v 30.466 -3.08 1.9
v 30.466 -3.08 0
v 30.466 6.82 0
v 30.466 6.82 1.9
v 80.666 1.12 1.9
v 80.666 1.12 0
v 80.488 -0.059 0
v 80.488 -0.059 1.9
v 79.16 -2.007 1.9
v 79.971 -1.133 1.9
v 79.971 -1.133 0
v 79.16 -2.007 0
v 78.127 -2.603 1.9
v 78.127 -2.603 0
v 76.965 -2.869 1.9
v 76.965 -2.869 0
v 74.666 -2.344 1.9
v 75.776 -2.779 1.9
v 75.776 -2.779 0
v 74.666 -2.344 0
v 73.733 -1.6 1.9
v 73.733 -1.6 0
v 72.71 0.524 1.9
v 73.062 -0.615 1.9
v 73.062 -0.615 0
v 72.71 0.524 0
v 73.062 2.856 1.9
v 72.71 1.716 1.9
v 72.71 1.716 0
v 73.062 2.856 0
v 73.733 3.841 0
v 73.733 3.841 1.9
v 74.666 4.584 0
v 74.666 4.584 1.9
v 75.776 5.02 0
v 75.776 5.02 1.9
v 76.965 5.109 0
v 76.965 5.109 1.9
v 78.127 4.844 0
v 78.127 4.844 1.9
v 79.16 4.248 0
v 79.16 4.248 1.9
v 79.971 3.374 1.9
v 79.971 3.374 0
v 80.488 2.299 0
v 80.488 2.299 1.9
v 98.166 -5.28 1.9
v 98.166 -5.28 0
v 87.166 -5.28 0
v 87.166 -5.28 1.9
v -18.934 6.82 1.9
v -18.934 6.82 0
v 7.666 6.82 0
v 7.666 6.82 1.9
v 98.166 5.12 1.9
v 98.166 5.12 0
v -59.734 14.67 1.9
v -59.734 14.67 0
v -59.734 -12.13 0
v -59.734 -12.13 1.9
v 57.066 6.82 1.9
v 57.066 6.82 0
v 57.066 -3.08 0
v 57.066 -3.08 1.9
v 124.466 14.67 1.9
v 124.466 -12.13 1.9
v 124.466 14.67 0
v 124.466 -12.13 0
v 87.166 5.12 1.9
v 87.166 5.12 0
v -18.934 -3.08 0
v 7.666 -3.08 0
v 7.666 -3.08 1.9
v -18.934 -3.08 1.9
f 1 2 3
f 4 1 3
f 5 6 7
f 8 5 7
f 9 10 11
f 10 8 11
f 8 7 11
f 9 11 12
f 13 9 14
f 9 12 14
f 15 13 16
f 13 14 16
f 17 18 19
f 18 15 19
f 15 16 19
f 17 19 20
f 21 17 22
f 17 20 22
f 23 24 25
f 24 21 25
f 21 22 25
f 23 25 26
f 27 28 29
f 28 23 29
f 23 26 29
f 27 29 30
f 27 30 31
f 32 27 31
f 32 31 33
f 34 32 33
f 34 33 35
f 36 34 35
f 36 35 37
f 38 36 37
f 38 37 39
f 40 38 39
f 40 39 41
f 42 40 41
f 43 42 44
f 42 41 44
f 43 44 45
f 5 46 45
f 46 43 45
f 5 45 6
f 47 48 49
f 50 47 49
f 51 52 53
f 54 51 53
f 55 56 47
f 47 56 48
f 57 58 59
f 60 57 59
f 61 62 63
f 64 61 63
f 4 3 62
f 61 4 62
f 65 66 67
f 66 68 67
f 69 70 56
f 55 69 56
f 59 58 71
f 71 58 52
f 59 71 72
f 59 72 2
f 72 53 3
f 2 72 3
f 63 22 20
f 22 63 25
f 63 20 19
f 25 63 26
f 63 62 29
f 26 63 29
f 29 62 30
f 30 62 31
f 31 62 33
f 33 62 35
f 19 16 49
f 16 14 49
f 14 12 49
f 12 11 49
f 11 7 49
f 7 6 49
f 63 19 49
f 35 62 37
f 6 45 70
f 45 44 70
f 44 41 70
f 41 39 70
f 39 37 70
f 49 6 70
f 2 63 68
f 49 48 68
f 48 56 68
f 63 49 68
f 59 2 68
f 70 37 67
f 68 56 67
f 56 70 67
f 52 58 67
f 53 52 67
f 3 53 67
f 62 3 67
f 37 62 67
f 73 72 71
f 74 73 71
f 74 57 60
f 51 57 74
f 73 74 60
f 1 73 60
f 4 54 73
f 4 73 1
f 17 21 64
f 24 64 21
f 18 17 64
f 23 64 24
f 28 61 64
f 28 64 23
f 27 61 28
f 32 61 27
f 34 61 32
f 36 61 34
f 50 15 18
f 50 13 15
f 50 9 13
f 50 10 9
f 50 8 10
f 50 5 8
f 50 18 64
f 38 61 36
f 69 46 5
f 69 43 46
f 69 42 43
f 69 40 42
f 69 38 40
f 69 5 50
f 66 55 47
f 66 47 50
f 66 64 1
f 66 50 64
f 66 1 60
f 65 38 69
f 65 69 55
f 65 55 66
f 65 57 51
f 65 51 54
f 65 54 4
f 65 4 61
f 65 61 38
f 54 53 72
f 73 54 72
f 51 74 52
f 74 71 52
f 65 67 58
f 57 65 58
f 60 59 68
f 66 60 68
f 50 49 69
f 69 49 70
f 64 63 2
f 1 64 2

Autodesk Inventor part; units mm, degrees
ref_plane "YZ Plane" through (0, 0, 0) normal (1, 0, 0) x (0, 1, 0)
ref_plane "XZ Plane" through (0, 0, 0) normal (0, 1, 0) x (-1, 0, 0)
ref_plane "XY Plane" through (0, 0, 0) normal (0, 0, 1) x (1, 0, 0)
sketch "Sketch1" plane through (0, 0, 0) normal (0, 0, 1) x (1, 0, 0)
  circle A0 centre (76.6657, 1.1203) radius 3
  line L0 (88.1657, -4.2797) -> (97.1657, -4.2797)
  line L1 (97.1657, -4.2797) -> (97.1657, 4.1203)
  line L2 (97.1657, 4.1203) -> (88.1657, 4.1203)
  line L3 (124.4657, -12.1297) -> (124.4657, 14.6703)
  line L4 (88.1657, 4.1203) -> (88.1657, -4.2797)
  line L5 (56.0657, -2.0797) -> (56.0657, 5.8203)
  line L6 (33.6679, 7.1494) -> (33.6679, -2.7506)
  line L7 (32.8657, 14.6703) -> (32.8657, -12.1297)
  line L8 (31.4657, -2.0797) -> (56.0657, -2.0797)
  line L9 (56.0657, 5.8203) -> (31.4657, 5.8203)
  line L10 (124.4657, 14.6703) -> (-59.7343, 14.6703)
  line L11 (-59.7343, -5.3797) -> (124.4657, -5.3797)
  line L12 (-59.7343, -12.1297) -> (124.4657, -12.1297)
  line L13 (31.4657, 5.8203) -> (31.4657, -2.0797)
  line L14 (-59.7343, 14.6703) -> (-59.7343, -12.1297)
  line L15 (6.6657, -2.0797) -> (6.6657, 5.8203)
  line L16 (-17.9343, -2.0797) -> (6.6657, -2.0797)
  line L17 (-17.9343, 5.8203) -> (-17.9343, -2.0797)
  line L18 (6.6657, 5.8203) -> (-17.9343, 5.8203)
  line L19 (7.6657, 6.8203) -> (7.6657, -3.0797)
  line L20 (7.6657, -3.0797) -> (-18.9343, -3.0797)
  line L21 (-18.9343, -3.0797) -> (-18.9343, 6.8203)
  line L22 (-18.9343, 6.8203) -> (7.6657, 6.8203)
  line L23 (57.0657, 6.8203) -> (57.0657, -3.0797)
  line L24 (57.0657, -3.0797) -> (30.4657, -3.0797)
  line L25 (30.4657, -3.0797) -> (30.4657, 6.8203)
  line L26 (30.4657, 6.8203) -> (57.0657, 6.8203)
  circle A1 centre (76.6657, 1.1203) radius 4
  line L27 (98.1657, 5.1203) -> (98.1657, -5.2797)
  line L28 (98.1657, -5.2797) -> (87.1657, -5.2797)
  line L29 (87.1657, -5.2797) -> (87.1657, 5.1203)
  line L30 (87.1657, 5.1203) -> (98.1657, 5.1203)
  point P0 (0, 0)
  point P1 (0, 0)
  dimension "d1" = 6.75
  dimension "d2" = 7.9
  dimension "d3" = 24.6
  dimension "d4" = 3.3
  dimension "d5" = 3.3
  dimension "d6" = 24.6
  dimension "d7" = 7.9
  dimension "d8" = 24.8
  dimension "d10" = 6
  dimension "d11" = 6.5
  dimension "d12" = 20.6
  dimension "d13" = 9
  dimension "d14" = 1.1
  dimension "d15" = 8.4
  dimension "d17" = 1
  dimension "d18" = 1
  dimension "d19" = 1
  dimension "d20" = 1
  dimension "d27" = 11.5
  dimension "d30" = 26.8
  dimension "d32" = 41.8
  dimension "d33" = 184.2
extrude "Extrusion1" add sketch "Sketch1" along normal blind 1.9 contours L12 L7 L11 L3 | L11 L7 L24 L23 L26 L10 L3 | L12 L14 L11 L7 | L11 L14 L10 L7 L26 L25 L24
equation "\"BendRadius\" = Thickness"
equation "\"BendReliefWidth\" = Thickness"
equation "\"BendReliefDepth\" = 0.5 * Thickness"
equation "\"CornerReliefSize\" = 4 * Thickness"
equation "\"MinimumRemnant\" = 2 * Thickness"
equation "\"TransitionRadius\" = BendRadius"
equation "\"JacobiRadiusSize\" = BendRadius"
equation "\"GapSize\" = Thickness"
equation "\"Thickness\" = 0.5"
properties part number "panel 2"
